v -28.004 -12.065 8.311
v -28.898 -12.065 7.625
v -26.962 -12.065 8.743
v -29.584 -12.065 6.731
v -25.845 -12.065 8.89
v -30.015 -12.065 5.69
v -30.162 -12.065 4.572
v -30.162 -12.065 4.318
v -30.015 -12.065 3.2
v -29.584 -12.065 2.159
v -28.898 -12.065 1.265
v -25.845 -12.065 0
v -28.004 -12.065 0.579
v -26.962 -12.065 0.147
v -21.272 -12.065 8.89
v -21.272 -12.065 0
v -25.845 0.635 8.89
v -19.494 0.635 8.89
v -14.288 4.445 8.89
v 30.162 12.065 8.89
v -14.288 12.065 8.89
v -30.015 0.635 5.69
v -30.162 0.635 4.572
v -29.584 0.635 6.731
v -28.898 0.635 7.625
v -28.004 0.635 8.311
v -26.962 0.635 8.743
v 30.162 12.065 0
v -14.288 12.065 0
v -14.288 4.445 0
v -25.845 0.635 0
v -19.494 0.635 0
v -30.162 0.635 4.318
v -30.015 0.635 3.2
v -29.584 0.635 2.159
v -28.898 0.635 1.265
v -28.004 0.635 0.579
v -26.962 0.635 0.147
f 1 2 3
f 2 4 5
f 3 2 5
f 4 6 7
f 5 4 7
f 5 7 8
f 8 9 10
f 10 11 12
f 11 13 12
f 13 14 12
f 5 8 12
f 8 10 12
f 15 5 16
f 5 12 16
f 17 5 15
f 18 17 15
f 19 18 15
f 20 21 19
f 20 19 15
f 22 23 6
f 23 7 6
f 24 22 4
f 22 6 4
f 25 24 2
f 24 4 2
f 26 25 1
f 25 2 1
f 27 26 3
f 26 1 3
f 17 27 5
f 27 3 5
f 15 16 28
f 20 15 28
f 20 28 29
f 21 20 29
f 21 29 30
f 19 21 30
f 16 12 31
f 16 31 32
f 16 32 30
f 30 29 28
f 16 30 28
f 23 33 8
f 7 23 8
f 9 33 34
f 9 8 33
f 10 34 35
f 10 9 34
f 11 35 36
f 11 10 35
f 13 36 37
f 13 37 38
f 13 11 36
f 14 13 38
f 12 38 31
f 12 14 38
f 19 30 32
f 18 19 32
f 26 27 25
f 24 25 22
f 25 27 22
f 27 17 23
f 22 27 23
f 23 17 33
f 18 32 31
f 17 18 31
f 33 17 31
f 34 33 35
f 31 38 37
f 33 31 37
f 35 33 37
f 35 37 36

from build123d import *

# Parameters (mm, degrees)
BOSS_EXTRUDE1_DEPTH = 8.89
FILLET1_R           = 4.318


with BuildPart() as part:
    # Sketch1 → Boss-Extrude1 (new body)
    with BuildSketch(Plane.XY):
        Polygon((-19.4945, 0.635), (-30.1625, 0.635), (-30.1625, -12.065), (-21.2725, -12.065), (30.1625, 12.065), (-14.2875, 12.065), (-14.2875, 4.445), align=None)
    extrude(amount=BOSS_EXTRUDE1_DEPTH)

    # Fillet1
    fillet1_edges = [part.edges().sort_by_distance(p)[0] for p in [
        (-30.1625, -5.715, 8.89),
        (-30.1625, -5.715, 0),
    ]]
    fillet(fillet1_edges, radius=FILLET1_R)


solid = part.part
